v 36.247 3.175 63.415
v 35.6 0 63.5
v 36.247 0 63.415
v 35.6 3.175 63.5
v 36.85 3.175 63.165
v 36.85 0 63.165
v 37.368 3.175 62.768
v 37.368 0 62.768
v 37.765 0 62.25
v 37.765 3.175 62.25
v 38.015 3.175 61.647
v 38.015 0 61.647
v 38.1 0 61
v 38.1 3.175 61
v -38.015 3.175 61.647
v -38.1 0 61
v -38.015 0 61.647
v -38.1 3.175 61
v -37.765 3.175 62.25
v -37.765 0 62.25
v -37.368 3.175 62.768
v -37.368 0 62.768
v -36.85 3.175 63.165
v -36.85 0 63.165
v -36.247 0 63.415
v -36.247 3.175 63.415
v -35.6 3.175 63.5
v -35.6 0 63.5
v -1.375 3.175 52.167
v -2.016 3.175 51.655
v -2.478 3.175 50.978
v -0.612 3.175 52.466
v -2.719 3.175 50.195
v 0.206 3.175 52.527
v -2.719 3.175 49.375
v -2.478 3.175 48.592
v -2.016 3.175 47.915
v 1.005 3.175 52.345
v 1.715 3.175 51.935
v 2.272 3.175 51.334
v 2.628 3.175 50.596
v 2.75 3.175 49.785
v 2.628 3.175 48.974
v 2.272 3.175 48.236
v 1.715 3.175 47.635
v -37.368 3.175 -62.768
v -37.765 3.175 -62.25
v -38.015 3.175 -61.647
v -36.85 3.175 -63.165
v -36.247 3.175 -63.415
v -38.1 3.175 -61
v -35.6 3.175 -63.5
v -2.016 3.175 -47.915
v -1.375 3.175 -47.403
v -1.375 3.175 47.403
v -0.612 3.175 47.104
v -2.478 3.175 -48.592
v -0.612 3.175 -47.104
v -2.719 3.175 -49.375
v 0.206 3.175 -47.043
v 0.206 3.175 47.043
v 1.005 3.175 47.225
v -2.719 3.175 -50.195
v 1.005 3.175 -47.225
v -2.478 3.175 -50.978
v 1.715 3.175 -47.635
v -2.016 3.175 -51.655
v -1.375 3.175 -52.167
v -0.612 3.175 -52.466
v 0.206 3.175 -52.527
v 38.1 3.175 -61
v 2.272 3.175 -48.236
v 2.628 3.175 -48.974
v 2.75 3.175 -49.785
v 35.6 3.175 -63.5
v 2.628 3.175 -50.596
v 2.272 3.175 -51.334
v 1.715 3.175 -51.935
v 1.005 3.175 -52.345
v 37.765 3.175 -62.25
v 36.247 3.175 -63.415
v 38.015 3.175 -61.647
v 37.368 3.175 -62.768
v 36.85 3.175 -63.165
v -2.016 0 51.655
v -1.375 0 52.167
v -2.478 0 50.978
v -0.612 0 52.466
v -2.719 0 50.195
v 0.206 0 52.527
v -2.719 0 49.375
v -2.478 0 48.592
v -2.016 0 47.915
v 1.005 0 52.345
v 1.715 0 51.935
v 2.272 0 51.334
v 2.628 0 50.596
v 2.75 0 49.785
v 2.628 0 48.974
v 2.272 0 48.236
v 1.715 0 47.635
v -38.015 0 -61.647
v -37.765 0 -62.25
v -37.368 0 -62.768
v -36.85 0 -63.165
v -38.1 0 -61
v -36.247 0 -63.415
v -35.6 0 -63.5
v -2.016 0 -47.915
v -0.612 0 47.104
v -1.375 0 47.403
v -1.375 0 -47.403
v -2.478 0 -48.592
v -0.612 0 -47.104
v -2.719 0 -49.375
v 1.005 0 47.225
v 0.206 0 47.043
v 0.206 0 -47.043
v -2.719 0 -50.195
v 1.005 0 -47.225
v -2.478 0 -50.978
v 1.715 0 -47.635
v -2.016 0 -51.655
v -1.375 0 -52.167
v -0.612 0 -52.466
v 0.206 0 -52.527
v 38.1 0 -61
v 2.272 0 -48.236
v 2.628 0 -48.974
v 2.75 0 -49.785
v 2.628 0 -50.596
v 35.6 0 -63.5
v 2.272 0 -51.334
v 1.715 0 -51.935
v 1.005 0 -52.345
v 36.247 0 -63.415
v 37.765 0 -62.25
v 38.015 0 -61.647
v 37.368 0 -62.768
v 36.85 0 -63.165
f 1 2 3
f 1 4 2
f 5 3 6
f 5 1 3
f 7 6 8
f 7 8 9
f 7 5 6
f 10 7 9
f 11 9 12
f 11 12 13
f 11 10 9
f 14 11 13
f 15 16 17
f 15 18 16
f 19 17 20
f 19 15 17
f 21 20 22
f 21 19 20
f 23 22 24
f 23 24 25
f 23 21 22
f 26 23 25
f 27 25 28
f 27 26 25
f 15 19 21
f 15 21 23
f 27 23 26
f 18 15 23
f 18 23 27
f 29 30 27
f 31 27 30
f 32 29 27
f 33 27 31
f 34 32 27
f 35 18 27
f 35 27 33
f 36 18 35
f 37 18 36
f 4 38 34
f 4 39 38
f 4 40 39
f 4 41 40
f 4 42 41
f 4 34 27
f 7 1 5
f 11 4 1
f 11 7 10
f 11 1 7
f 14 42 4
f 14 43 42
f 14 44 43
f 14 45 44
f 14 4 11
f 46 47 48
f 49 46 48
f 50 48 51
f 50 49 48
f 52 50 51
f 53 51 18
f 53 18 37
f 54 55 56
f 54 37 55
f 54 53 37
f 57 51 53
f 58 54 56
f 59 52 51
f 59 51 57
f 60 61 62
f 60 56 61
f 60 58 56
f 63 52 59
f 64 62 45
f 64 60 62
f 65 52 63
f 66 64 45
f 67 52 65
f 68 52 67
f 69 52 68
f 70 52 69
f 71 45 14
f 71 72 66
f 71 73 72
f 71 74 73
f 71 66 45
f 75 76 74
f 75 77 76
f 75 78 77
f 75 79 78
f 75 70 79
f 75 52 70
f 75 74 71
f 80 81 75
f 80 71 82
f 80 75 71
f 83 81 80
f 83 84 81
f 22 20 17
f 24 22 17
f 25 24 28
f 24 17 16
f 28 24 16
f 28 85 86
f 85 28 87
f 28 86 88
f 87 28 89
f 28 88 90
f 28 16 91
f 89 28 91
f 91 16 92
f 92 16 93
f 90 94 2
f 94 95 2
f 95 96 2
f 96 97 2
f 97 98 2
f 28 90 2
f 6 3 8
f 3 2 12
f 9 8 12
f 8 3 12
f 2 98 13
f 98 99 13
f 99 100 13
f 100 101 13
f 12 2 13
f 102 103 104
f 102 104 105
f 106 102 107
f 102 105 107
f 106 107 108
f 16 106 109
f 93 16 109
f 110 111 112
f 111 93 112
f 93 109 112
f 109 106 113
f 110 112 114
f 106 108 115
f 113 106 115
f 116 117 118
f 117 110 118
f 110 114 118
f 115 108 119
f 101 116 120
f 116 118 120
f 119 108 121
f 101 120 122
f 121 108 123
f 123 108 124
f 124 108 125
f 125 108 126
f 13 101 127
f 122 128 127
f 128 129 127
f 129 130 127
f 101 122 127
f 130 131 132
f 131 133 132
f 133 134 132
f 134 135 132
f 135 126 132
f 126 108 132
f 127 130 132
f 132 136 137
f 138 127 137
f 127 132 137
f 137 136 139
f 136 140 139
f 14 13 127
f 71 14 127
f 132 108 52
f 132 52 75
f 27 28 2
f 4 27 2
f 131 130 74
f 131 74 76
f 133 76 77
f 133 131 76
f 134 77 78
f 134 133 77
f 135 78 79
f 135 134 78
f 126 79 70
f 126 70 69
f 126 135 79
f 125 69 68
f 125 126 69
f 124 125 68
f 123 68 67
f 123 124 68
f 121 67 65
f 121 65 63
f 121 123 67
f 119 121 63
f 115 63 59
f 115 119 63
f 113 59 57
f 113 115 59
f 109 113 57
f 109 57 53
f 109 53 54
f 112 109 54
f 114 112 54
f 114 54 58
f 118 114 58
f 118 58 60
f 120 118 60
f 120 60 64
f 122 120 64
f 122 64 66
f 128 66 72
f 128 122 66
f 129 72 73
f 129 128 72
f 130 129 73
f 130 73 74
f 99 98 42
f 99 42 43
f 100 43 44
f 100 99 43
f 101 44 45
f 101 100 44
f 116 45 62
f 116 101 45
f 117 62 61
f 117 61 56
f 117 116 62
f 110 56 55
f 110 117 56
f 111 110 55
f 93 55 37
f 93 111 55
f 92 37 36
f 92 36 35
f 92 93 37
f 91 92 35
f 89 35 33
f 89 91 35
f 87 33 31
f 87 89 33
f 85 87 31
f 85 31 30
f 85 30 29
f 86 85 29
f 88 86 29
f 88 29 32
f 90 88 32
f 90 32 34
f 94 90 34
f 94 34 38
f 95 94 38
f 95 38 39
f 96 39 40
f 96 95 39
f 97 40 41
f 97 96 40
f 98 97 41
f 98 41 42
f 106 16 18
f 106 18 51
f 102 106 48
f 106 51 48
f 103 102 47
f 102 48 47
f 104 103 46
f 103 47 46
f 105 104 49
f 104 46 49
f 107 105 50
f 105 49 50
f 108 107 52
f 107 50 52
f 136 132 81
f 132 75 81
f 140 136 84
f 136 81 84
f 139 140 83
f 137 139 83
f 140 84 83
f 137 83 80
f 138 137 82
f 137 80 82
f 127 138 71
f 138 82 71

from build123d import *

# Parameters (mm, degrees)
SKETCH1_W           = 76.2
SKETCH1_H           = 127
SKETCH1_R           = 2.75
BOSS_EXTRUDE1_DEPTH = 3.175
FILLET1_R           = 2.5


with BuildPart() as part:
    # Sketch1 → Boss-Extrude1 (new body)
    with BuildSketch(Plane(origin=(0, 0, 0), x_dir=(1, 0, 0), z_dir=(0, 1, 0))):
        Rectangle(SKETCH1_W, SKETCH1_H)
        with Locations((0, 49.785)):
            Circle(SKETCH1_R, mode=Mode.SUBTRACT)
        with Locations((0, -49.785)):
            Circle(SKETCH1_R, mode=Mode.SUBTRACT)
    extrude(amount=BOSS_EXTRUDE1_DEPTH)

    # Fillet1
    fillet1_edges = [part.edges().sort_by_distance(p)[0] for p in [
        (38.1, 1.5875, 63.5),
        (-38.1, 1.5875, 63.5),
        (-38.1, 1.5875, -63.5),
        (38.1, 1.5875, -63.5),
    ]]
    fillet(fillet1_edges, radius=FILLET1_R)


solid = part.part
